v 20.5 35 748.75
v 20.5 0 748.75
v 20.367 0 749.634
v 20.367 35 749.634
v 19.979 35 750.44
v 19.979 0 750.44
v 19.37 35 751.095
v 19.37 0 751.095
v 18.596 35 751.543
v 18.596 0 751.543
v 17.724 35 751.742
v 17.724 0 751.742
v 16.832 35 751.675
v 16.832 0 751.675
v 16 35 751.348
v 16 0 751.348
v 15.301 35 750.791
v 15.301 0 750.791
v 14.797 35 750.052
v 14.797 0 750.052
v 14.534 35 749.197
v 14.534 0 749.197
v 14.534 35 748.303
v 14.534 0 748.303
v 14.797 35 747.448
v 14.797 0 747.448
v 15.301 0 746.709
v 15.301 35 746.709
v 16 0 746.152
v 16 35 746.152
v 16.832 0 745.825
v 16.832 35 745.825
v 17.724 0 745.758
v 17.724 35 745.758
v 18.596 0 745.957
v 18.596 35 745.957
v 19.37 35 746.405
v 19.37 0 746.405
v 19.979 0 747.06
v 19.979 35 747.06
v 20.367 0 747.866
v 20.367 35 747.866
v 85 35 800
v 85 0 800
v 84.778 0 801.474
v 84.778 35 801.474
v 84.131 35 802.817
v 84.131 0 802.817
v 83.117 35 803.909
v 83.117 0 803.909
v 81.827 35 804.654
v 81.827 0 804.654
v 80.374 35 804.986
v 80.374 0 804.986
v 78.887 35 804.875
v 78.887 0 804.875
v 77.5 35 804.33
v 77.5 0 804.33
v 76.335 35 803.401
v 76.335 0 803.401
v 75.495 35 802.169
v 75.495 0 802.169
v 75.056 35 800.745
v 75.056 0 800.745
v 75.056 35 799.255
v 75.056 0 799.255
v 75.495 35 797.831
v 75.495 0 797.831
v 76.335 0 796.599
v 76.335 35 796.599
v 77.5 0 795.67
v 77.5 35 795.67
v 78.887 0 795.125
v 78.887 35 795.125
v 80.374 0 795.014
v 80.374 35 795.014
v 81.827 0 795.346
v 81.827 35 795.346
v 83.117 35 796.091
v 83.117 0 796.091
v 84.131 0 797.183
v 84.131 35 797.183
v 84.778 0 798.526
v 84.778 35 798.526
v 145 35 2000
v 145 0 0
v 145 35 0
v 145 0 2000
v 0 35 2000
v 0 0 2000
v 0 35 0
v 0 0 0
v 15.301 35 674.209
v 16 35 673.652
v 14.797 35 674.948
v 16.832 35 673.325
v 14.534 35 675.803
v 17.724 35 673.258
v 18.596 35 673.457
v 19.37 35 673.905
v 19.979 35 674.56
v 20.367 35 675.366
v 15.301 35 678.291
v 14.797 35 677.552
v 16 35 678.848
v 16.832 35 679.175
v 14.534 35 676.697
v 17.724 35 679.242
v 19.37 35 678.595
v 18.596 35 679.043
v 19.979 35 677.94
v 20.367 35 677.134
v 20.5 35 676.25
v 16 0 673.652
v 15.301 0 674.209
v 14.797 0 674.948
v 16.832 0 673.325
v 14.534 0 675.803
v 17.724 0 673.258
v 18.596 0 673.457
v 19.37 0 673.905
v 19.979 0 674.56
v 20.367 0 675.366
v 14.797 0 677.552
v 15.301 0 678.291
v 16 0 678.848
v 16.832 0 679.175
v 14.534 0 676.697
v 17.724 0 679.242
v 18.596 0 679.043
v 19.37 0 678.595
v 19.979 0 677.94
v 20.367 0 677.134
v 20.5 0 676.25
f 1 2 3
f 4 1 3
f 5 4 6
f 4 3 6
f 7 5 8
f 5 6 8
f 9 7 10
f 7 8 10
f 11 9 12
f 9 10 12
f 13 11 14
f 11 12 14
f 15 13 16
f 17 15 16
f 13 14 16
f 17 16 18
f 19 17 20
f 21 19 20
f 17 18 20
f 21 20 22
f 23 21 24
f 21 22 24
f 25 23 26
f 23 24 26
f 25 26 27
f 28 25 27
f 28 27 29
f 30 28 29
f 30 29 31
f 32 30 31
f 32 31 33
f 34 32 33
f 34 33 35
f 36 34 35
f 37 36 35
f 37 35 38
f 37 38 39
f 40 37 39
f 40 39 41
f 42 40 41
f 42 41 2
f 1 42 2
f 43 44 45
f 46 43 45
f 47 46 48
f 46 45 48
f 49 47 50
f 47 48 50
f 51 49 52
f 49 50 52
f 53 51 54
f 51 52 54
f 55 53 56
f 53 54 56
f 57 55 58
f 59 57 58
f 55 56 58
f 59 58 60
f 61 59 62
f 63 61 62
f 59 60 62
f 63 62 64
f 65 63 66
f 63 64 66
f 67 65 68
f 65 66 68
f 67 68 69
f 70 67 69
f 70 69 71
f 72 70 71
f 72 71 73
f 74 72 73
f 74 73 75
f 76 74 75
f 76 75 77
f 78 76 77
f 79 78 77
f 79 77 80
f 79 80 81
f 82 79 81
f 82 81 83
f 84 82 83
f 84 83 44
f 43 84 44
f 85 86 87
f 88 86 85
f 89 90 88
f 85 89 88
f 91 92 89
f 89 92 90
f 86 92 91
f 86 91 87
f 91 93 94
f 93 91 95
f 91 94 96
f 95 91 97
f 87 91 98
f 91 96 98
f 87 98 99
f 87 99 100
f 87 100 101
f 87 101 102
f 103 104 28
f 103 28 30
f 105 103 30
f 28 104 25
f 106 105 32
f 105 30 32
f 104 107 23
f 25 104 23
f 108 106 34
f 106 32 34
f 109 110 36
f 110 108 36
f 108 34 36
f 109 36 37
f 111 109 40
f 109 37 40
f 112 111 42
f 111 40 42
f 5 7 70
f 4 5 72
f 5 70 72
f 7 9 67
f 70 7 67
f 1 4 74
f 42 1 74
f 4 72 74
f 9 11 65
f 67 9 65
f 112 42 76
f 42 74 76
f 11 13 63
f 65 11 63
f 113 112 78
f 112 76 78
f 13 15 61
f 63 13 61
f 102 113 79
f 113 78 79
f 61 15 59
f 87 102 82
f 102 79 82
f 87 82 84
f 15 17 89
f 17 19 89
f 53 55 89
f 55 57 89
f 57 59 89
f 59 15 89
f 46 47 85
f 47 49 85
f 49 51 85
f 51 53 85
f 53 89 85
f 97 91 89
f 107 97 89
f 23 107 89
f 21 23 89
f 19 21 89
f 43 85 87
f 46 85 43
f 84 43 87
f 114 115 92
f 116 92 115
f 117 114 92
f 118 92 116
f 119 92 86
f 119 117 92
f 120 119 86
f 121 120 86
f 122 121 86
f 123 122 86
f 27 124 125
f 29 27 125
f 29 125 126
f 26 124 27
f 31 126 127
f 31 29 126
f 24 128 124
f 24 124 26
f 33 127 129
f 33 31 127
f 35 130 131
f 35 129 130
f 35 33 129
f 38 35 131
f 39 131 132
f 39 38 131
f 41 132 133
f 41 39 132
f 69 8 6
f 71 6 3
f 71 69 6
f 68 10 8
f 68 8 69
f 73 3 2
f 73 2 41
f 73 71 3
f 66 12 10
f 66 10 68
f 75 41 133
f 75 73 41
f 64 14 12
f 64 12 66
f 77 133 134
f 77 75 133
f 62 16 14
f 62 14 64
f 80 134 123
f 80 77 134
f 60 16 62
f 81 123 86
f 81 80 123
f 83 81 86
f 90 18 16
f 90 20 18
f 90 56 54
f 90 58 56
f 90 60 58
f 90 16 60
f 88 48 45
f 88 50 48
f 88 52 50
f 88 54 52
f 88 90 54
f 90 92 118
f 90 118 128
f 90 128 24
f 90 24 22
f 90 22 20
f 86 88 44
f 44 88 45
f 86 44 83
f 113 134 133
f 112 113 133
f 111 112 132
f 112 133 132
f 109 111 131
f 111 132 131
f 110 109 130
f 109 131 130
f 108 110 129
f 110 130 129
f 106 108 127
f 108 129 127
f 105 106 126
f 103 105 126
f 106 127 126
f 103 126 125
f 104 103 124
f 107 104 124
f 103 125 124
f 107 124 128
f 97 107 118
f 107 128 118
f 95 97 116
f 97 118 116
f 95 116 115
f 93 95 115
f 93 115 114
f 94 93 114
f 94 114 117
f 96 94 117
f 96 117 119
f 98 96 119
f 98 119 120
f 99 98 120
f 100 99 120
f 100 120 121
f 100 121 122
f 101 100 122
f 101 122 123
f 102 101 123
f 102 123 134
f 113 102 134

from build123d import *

# Parameters (mm, degrees)
F0_W     = 145
F0_H     = 2000
F1_DEPTH = 35
F2_R     = 5
F3_DEPTH = 35.001
F4_R     = 3
F5_DEPTH = 35.001


with BuildPart() as f1:
    # F0 (on Front) → F1 (new body)
    with BuildSketch(Plane.XZ):
        with Locations((72.5, 1000)):
            Rectangle(F0_W, F0_H)
    extrude(amount=-F1_DEPTH)

    # F2 (on face) → F3 (cut, through all)
    with BuildSketch(Plane.XZ):
        with Locations((80, 800)):
            Circle(F2_R)
    extrude(amount=-F3_DEPTH, mode=Mode.SUBTRACT)

    # F4 (on face) → F5 (cut, through all)
    with BuildSketch(Plane.XZ):
        with Locations((17.5, 676.25)):
            Circle(F4_R)
        with Locations((17.5, 748.75)):
            Circle(F4_R)
    extrude(amount=-F5_DEPTH, mode=Mode.SUBTRACT)


solid = f1.part
